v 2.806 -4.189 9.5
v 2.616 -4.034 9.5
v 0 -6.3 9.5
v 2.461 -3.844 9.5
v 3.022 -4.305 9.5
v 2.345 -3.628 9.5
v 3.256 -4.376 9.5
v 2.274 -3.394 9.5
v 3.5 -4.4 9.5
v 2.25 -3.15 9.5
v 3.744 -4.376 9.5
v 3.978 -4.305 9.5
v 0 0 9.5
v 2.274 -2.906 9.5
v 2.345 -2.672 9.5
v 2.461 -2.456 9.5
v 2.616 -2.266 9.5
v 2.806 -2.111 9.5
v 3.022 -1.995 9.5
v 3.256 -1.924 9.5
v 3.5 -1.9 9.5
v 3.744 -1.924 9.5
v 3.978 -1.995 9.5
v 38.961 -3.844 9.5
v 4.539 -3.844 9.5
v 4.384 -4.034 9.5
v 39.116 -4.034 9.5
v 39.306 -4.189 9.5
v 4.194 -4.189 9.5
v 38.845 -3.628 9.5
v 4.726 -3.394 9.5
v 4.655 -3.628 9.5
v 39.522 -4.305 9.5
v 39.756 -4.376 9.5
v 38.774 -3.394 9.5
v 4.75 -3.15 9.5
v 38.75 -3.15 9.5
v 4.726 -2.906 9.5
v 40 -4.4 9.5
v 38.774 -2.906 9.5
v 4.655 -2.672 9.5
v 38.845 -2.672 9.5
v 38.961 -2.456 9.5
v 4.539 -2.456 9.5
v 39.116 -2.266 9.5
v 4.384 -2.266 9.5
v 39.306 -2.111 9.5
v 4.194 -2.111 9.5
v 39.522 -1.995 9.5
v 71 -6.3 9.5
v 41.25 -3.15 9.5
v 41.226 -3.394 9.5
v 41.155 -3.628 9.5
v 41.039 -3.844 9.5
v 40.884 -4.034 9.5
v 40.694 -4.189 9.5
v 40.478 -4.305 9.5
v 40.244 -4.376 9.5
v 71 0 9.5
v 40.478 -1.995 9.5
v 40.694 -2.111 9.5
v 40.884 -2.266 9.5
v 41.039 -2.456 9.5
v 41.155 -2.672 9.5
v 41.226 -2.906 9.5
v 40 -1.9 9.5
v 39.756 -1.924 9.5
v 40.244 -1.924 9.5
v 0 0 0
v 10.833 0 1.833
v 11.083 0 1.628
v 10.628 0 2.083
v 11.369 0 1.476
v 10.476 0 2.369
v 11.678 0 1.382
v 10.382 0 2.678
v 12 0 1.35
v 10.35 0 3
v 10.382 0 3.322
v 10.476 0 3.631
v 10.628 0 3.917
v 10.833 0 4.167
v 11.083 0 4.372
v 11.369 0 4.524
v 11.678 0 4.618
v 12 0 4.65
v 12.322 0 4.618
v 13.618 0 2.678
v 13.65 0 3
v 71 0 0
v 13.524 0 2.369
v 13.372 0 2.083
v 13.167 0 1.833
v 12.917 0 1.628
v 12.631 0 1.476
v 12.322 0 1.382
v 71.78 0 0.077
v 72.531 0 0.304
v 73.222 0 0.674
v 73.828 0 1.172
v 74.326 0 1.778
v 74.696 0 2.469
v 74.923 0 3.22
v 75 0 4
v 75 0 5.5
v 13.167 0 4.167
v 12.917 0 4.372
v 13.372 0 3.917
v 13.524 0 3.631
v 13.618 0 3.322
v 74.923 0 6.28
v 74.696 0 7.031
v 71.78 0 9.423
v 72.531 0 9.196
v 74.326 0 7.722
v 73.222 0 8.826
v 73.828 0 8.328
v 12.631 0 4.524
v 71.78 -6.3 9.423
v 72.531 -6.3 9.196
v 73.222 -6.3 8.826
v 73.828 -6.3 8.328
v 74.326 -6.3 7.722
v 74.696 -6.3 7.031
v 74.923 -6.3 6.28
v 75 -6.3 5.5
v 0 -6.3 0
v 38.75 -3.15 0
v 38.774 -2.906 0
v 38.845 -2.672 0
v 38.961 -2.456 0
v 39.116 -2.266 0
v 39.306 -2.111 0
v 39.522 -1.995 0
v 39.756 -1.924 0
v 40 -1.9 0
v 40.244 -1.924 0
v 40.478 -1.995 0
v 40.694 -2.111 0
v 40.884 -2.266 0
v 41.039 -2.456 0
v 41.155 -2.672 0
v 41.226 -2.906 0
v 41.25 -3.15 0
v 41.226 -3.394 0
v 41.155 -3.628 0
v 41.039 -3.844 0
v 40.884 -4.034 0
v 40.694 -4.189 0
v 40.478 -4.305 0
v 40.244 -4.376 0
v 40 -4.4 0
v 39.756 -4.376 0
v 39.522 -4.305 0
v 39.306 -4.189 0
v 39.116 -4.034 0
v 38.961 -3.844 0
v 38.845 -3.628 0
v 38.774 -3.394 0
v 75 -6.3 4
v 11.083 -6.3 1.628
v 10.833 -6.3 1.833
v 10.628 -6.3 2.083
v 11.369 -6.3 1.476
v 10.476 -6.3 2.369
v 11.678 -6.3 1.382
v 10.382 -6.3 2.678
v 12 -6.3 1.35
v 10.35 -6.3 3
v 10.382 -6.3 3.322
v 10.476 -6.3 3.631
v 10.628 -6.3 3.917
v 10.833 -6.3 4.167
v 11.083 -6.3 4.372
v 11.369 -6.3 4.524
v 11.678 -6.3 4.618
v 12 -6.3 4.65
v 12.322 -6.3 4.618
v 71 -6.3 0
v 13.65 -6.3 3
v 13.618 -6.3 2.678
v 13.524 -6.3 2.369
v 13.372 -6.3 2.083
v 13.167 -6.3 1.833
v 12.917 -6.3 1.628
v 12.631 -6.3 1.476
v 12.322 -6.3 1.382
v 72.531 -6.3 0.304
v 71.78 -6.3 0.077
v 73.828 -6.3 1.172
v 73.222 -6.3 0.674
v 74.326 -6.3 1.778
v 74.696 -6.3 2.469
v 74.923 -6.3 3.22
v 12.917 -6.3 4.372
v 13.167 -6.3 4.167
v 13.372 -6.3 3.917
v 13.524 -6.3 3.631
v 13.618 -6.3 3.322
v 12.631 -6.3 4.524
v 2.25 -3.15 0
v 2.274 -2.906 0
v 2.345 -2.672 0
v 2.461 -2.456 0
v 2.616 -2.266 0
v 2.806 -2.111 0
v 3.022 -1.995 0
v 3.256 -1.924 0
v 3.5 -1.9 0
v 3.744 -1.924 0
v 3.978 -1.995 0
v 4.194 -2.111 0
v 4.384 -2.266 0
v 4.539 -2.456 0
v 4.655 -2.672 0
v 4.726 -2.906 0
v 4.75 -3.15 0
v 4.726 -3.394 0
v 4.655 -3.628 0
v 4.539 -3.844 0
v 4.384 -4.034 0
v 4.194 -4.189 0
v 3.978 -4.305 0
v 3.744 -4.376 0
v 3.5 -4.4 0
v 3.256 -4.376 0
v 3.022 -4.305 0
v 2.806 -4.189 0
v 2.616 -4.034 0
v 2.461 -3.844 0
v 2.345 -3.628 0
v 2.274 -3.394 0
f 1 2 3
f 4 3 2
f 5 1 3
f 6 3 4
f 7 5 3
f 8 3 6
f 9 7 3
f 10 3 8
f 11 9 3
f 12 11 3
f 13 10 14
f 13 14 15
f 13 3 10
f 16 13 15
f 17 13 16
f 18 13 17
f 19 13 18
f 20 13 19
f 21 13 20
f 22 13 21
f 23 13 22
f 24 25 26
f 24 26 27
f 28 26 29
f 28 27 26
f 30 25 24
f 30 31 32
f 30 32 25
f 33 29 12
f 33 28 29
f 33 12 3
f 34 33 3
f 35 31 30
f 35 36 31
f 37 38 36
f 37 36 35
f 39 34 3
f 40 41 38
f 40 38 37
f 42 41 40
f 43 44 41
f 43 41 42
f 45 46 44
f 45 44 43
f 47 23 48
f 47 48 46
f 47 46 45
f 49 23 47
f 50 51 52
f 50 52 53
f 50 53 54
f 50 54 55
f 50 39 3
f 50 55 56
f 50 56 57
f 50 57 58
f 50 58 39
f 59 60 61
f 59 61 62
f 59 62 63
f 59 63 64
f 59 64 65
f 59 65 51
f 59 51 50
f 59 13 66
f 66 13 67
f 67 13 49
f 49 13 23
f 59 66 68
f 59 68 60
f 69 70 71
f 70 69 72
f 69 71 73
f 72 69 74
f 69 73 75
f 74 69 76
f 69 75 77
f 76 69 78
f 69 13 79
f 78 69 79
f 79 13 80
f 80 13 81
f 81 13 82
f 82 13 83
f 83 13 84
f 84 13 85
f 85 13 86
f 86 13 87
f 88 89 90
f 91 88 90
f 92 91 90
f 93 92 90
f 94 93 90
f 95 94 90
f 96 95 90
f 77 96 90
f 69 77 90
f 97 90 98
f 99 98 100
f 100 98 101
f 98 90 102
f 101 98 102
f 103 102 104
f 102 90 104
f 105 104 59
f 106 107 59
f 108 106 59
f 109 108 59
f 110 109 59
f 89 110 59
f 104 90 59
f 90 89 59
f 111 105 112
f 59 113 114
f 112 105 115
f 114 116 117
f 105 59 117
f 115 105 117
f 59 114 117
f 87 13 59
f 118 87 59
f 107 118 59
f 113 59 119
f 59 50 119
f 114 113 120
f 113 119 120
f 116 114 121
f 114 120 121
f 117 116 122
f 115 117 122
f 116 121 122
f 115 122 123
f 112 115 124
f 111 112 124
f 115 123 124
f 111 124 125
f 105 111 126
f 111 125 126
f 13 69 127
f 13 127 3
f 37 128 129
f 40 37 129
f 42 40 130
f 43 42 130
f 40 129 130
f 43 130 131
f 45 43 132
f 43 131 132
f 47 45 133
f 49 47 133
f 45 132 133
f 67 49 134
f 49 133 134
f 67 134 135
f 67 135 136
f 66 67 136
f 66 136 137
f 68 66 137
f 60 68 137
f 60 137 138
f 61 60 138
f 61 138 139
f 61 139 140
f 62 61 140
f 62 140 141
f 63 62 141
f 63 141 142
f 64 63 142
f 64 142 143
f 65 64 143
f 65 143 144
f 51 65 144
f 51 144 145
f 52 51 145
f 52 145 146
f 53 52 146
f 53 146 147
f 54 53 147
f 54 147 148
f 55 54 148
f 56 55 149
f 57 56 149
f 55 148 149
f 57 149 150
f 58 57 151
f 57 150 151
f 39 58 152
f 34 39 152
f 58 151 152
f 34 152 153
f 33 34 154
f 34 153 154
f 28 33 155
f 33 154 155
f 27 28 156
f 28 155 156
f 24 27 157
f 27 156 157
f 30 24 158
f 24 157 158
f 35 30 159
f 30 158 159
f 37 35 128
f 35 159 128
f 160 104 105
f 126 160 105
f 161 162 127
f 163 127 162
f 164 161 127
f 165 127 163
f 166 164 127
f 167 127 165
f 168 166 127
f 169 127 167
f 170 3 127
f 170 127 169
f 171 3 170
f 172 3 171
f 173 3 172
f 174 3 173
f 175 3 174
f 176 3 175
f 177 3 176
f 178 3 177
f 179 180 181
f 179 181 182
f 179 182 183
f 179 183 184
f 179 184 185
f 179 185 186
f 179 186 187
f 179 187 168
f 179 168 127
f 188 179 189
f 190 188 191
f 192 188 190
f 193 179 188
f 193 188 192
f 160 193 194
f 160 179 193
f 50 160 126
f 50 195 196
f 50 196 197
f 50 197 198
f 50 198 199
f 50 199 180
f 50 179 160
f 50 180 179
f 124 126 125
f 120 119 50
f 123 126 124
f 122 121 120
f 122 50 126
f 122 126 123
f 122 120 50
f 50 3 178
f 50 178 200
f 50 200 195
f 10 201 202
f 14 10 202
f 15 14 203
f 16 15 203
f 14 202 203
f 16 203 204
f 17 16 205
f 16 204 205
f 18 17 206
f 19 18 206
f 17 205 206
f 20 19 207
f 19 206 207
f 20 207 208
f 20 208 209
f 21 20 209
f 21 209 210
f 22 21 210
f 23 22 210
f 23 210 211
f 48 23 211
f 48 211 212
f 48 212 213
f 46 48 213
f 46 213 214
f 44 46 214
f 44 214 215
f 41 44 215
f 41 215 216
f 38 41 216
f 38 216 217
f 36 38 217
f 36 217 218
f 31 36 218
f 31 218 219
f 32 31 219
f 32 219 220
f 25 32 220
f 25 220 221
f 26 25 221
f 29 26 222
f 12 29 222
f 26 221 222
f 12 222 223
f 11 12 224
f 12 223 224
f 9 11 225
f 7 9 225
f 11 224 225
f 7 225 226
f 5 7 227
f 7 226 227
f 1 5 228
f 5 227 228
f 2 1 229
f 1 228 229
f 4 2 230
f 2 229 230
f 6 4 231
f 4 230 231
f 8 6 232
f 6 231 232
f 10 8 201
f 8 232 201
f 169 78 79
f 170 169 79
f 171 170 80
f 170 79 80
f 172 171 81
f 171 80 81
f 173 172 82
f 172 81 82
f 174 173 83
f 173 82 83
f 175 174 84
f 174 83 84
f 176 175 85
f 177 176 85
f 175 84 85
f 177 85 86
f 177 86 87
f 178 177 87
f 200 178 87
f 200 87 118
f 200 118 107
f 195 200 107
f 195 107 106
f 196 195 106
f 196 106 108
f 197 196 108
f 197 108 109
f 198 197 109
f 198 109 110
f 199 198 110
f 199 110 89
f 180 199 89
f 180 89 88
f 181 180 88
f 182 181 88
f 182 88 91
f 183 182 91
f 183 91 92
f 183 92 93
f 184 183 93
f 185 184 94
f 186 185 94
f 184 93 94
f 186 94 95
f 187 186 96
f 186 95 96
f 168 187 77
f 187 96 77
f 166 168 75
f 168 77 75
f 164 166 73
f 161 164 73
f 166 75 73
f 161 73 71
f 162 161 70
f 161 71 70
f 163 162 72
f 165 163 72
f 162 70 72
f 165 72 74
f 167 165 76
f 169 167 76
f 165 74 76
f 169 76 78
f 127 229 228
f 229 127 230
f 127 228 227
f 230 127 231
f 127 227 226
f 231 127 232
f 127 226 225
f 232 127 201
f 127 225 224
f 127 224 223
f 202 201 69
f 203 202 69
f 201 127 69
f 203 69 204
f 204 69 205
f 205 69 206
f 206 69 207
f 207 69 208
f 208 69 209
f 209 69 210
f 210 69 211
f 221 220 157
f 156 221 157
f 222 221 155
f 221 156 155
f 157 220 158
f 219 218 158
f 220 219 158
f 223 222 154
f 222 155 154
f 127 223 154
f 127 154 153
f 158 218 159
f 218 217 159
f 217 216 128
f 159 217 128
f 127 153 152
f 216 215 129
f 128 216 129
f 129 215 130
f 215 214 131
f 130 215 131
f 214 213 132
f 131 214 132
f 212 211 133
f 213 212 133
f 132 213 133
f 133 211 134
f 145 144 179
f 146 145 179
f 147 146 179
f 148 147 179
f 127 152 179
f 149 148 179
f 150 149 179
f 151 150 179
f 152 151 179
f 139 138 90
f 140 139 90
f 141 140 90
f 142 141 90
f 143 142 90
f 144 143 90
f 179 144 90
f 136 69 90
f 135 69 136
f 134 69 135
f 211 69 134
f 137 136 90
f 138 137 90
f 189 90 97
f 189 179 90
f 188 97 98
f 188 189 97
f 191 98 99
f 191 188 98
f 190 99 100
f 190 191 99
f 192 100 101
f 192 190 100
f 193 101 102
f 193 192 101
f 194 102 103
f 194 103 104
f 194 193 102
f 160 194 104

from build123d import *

# Parameters (mm, degrees)
F0_W     = 75
F0_H     = 9.5
F1_DEPTH = 6.3
F3_D     = 2.5
F5_D     = 3.3
F6_R     = 4


with BuildPart() as f1:
    # F0 (on Front) → F1 (new body)
    with BuildSketch(Plane.XZ):
        with Locations((37.5, 4.75)):
            Rectangle(F0_W, F0_H)
    extrude(amount=F1_DEPTH)

    # F3 (through all)
    with Locations(Plane.XY.offset(9.5)):
        with Locations((3.5, -3.15), (40, -3.15)):
            Hole(F3_D / 2)

    # F5 (through all)
    with Locations(Plane.XZ.offset(6.3)):
        with Locations((12, 3)):
            Hole(F5_D / 2)

    # F6
    f6_edges = [f1.edges().sort_by_distance(p)[0] for p in [
        (75, -3.15, 9.5),
        (75, -3.15, 0),
    ]]
    fillet(f6_edges, radius=F6_R)


solid = f1.part
